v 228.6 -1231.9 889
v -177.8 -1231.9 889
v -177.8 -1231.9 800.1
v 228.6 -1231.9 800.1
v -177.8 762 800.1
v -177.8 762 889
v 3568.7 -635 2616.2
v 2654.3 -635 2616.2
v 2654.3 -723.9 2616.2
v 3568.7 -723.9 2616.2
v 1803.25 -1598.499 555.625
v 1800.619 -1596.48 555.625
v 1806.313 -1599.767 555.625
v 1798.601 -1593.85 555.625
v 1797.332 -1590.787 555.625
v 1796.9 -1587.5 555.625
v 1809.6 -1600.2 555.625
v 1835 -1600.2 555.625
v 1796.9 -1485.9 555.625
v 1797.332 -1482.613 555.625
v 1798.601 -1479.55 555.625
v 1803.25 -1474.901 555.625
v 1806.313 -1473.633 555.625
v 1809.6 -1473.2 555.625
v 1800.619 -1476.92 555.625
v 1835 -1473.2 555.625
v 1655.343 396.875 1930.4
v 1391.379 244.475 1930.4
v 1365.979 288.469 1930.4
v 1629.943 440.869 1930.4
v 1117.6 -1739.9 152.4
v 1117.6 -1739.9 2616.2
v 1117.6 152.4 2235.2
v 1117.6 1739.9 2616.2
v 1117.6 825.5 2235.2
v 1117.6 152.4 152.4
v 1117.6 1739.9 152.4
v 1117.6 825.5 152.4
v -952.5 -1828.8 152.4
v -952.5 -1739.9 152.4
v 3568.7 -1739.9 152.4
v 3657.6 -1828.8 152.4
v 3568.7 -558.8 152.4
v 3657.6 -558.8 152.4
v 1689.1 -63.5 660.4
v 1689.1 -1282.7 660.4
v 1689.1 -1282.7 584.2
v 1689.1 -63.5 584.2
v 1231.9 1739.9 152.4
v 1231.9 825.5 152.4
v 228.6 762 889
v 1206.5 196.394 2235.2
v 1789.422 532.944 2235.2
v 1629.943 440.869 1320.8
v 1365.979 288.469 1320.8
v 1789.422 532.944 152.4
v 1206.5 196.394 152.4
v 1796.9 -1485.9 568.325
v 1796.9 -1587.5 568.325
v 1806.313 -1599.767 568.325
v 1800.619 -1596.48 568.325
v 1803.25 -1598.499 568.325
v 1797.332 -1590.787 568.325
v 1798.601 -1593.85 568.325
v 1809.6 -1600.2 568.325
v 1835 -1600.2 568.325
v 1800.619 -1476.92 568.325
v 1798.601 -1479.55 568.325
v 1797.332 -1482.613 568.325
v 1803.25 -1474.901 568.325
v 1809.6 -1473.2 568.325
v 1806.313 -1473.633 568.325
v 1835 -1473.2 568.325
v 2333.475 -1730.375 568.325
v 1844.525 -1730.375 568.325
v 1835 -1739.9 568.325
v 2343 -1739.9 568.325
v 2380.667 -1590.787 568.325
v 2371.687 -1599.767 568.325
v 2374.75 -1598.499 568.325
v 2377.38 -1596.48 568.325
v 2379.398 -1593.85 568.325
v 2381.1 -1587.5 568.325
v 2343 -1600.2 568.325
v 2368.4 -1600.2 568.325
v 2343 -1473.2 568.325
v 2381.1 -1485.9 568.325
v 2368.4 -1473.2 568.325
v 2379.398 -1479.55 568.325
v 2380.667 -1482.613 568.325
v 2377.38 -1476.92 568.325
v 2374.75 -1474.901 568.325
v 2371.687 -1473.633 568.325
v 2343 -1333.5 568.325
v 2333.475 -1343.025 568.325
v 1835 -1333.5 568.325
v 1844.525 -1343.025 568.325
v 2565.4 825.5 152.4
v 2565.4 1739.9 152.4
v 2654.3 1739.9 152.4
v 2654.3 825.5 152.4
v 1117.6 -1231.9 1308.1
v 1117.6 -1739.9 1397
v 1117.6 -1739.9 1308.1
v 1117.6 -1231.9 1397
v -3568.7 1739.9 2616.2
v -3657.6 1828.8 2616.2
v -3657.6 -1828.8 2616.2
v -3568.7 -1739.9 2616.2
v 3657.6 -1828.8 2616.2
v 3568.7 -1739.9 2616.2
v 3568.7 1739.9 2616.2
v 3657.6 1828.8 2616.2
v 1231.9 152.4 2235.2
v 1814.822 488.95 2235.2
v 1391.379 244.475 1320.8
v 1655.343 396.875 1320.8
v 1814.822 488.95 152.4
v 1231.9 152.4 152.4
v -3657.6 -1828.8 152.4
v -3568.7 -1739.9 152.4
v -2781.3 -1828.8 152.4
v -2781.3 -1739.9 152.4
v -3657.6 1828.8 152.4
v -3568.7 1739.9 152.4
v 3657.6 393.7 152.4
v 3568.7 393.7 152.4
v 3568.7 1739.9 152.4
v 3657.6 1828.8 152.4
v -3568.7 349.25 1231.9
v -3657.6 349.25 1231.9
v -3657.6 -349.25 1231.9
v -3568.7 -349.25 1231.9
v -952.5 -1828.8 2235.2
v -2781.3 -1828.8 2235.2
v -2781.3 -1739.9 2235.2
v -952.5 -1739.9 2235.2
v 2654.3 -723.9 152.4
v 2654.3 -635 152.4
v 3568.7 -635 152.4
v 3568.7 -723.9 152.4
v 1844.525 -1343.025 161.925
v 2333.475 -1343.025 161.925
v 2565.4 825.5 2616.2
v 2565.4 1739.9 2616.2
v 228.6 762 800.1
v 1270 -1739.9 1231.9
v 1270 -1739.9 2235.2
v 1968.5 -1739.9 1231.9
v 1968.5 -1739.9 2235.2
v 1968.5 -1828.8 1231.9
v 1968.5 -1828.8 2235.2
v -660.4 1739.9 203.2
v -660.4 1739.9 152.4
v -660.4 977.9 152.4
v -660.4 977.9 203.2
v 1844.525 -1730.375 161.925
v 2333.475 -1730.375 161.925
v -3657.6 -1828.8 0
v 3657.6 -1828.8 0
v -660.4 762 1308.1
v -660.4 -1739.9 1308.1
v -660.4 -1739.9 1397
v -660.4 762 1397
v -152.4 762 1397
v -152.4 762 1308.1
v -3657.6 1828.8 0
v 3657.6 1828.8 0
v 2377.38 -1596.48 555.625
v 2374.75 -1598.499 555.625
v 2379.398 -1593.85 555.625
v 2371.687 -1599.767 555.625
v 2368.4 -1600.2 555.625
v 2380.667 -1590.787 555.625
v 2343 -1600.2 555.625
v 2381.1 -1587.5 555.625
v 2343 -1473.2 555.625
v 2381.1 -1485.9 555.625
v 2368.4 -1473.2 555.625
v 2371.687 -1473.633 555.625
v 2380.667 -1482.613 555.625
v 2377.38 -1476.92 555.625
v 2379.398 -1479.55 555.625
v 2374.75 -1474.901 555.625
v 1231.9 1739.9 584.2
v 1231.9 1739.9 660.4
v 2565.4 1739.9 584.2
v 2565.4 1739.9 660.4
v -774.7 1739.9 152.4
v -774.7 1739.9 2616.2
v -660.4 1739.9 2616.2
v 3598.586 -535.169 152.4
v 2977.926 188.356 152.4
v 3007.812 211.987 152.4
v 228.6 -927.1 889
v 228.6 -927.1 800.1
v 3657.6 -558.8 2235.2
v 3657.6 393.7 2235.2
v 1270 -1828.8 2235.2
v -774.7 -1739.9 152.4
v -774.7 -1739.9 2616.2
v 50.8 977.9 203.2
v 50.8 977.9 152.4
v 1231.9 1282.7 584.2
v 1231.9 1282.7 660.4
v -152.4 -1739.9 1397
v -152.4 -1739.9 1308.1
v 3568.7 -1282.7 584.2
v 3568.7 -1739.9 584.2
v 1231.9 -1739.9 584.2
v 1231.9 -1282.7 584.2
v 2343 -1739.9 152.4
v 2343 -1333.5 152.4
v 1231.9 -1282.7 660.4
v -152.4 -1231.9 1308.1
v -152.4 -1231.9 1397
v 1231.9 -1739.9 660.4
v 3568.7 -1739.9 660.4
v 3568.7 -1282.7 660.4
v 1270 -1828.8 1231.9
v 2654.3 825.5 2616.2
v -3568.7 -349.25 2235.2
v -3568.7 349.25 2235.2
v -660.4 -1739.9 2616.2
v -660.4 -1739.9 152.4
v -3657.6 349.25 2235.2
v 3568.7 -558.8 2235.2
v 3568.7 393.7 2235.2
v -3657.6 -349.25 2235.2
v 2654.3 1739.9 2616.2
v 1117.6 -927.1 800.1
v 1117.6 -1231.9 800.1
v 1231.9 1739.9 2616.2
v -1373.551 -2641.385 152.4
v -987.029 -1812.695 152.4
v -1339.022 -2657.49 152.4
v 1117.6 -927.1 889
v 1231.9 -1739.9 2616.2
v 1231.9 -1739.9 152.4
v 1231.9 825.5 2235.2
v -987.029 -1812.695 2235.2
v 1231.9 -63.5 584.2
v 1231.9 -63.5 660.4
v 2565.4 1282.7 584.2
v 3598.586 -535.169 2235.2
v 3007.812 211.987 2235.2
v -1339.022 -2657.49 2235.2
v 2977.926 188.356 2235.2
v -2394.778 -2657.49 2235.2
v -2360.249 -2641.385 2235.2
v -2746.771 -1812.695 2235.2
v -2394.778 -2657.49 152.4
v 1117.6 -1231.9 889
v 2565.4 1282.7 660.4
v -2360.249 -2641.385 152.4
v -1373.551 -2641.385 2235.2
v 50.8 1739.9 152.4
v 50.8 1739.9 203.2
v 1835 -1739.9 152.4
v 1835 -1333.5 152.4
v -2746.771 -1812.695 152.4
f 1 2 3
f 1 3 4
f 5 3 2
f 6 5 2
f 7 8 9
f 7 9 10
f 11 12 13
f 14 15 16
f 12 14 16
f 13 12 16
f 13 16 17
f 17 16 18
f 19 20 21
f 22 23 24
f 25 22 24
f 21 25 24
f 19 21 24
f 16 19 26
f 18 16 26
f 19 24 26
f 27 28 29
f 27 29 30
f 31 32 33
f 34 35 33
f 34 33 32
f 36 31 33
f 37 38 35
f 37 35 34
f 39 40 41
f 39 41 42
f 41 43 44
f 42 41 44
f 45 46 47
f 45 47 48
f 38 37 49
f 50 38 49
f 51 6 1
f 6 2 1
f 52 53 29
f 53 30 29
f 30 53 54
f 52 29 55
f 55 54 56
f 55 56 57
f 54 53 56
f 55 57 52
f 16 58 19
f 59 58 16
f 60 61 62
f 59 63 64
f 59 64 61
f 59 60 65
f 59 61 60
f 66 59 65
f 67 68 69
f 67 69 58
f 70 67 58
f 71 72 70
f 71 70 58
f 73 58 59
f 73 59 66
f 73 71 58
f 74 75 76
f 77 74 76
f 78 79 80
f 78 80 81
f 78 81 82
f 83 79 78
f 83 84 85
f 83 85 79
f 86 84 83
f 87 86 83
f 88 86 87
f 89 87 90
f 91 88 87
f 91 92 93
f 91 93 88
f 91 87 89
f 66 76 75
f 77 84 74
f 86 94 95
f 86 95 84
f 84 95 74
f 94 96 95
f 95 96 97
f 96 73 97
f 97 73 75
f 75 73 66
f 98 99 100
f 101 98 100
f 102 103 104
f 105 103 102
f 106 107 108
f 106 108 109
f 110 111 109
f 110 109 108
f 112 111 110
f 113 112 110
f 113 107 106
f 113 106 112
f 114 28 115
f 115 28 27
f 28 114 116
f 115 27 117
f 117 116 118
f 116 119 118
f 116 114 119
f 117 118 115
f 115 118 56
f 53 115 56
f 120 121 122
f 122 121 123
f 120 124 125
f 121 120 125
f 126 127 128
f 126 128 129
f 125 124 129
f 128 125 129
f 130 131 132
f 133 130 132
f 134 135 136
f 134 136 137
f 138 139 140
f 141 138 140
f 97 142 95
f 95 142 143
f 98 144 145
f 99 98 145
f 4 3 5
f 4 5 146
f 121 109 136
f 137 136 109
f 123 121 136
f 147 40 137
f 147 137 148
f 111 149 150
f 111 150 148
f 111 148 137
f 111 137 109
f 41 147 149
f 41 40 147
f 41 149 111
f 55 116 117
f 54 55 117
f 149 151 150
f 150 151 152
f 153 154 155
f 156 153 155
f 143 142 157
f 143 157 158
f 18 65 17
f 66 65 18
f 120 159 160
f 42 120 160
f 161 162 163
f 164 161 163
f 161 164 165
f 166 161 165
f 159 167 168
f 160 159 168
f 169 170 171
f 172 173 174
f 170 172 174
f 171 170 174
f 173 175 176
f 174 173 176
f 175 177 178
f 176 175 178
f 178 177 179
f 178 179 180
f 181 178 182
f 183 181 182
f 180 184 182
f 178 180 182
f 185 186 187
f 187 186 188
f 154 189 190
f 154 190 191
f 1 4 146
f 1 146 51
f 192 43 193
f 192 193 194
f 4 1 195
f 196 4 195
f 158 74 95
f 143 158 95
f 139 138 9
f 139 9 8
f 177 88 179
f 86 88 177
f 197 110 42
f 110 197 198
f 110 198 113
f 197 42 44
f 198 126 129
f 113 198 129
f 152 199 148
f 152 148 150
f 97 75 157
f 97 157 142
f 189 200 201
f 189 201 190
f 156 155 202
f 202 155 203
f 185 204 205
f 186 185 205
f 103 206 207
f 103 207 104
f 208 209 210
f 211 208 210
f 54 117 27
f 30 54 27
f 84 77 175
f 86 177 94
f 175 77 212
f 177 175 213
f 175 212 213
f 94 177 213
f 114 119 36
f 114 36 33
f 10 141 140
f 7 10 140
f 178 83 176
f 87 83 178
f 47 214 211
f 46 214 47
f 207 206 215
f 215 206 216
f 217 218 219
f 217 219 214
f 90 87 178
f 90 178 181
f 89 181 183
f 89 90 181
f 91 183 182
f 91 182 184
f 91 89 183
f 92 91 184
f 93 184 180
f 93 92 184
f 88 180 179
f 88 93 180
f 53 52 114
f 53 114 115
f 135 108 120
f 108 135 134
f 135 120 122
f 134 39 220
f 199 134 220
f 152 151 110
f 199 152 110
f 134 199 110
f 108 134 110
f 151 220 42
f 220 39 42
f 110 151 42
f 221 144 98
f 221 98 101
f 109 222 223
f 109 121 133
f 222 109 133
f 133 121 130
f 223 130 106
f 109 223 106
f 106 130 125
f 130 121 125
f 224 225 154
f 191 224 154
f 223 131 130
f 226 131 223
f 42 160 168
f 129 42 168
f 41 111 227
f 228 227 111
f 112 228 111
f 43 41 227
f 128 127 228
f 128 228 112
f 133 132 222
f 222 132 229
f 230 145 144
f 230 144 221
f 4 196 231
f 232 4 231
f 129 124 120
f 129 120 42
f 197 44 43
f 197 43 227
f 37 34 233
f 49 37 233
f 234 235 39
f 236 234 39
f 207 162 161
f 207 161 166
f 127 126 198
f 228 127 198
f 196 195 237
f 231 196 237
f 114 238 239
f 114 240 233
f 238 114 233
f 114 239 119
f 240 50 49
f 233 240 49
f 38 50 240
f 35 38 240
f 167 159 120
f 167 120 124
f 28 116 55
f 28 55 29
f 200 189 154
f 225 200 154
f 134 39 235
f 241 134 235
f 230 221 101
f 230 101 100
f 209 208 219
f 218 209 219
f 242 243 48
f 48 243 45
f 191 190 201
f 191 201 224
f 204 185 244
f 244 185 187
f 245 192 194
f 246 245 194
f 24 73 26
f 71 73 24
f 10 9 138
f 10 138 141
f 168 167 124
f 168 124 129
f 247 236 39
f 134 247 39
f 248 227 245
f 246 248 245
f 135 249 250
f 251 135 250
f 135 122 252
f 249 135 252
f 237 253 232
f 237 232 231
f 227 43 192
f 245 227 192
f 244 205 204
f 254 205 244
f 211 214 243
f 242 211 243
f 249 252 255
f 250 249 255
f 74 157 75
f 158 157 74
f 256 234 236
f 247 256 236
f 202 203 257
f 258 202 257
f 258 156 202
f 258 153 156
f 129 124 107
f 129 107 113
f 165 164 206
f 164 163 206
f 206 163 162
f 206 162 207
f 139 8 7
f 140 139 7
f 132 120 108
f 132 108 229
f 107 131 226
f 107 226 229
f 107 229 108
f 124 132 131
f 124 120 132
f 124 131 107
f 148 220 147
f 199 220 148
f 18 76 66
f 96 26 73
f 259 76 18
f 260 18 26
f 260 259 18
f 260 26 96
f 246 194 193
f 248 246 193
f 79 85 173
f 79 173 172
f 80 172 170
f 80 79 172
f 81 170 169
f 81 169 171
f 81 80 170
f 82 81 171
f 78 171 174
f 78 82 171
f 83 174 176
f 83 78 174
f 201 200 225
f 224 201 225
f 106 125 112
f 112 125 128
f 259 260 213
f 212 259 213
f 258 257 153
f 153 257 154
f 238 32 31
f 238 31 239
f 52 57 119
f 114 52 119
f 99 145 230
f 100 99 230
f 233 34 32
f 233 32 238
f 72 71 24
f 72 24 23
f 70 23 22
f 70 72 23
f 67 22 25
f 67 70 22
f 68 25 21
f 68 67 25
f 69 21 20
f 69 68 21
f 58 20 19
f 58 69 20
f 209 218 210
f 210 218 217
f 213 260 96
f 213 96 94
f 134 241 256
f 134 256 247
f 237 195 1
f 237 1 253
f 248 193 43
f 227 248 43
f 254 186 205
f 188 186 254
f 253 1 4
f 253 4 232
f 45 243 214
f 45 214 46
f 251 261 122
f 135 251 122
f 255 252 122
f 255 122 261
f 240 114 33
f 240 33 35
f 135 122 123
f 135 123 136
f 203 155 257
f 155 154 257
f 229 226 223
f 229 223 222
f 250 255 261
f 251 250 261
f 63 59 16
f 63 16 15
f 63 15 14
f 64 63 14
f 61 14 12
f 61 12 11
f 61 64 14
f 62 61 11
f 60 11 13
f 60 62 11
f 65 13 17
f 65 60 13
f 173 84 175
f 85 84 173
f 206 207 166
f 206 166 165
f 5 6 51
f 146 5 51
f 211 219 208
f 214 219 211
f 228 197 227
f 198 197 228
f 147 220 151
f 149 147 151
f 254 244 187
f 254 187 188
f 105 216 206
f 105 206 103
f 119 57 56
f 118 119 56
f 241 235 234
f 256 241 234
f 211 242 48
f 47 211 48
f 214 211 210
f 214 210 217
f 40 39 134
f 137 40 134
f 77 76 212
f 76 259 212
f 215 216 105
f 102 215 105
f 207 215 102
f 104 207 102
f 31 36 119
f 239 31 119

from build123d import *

# Parameters (mm, degrees)
F0_W           = 7315.2
F0_H           = 3657.6
F1_DEPTH       = 152.4
F2_W           = 7315.2
F2_H           = 3657.6
F2_W_2         = 7137.4
F2_H_2         = 3479.8
F3_DEPTH       = 2463.8
F4_W           = 952.5
F4_H           = 2082.8
F5_DEPTH       = 88.9
F6_W           = 1828.8
F6_H           = 2082.8
F6_W_2         = 698.5
F6_H_2         = 1003.3
F7_DEPTH       = 88.9
F8_W           = 698.5
F8_H           = 1003.3
F9_DEPTH       = 88.9
F10_W          = 114.3
F10_H          = 3479.8
F11_DEPTH      = 2463.8
F12_W          = 914.4
F12_H          = 88.9
F13_DEPTH      = 2463.8
F14_W          = 673.1
F14_H          = 2082.8
F15_DEPTH      = 114.3
F16_W          = 508
F16_H          = 88.9
F17_DEPTH      = 1739.9
F17_DEPTH_BACK = 762
F18_W          = 1270
F18_H          = 508
F19_DEPTH      = 88.9
F20_W          = 406.4
F20_H          = 88.9
F21_DEPTH      = 1231.9
F21_DEPTH_BACK = 762
F22_W          = 889
F22_H          = 304.8
F24_DEPTH      = 88.9
F26_DEPTH      = 2082.8
F28_DEPTH      = 2082.8
F29_W          = 2336.8
F29_H          = 76.2
F30_DEPTH      = 457.2
F31_W          = 304.8
F31_H          = 609.6
F32_DEPTH      = 50.8
F34_DEPTH      = 50.8
F35_W          = 508
F35_H          = 406.4
F36_DEPTH      = 9.525
F37_W          = 508
F37_H          = 406.4
F37_W_2        = 488.95
F37_H_2        = 387.35
F38_DEPTH      = 406.4
F40_DEPTH      = 12.7
F42_DEPTH      = 2082.8
F43_W          = 88.9
F43_H          = 914.4
F44_DEPTH      = 2463.8
F45_W          = 457.2
F45_H          = 1219.2
F46_DEPTH      = 76.2
F47_W          = 1333.5
F47_H          = 76.2
F48_DEPTH      = 457.2


with BuildPart() as f1:
    # F0 (on Top) → F1 (new body)
    with BuildSketch(Plane.XY):
        Rectangle(F0_W, F0_H)
    extrude(amount=F1_DEPTH)


with BuildPart() as f3:
    # F2 (on face) → F3 (new body)
    with BuildSketch(Plane.XY.offset(152.4)):
        Rectangle(F2_W, F2_H)
        Rectangle(F2_W_2, F2_H_2, mode=Mode.SUBTRACT)
    extrude(amount=F3_DEPTH)

    # F4 (on face) → F5 (cut, through all)
    with BuildSketch(Plane.YZ.offset(3657.6)):
        with Locations((-82.55, 1193.8)):
            Rectangle(F4_W, F4_H)
    extrude(amount=-F5_DEPTH, mode=Mode.SUBTRACT)

    # F6 (on face) → F7 (cut, through all)
    with BuildSketch(Plane.XZ.offset(1828.8)):
        with Locations((-1866.9, 1193.8)):
            Rectangle(F6_W, F6_H)
        with Locations((1619.25, 1733.55)):
            Rectangle(F6_W_2, F6_H_2)
    extrude(amount=-F7_DEPTH, mode=Mode.SUBTRACT)

    # F8 (on face) → F9 (cut, through all)
    with BuildSketch(Plane(origin=(-3657.6, 0, 0), x_dir=(0, -1, 0), z_dir=(-1, 0, 0))):
        with Locations((0, 1733.55)):
            Rectangle(F8_W, F8_H)
    extrude(amount=-F9_DEPTH, mode=Mode.SUBTRACT)


with BuildPart() as f11:
    # F10 (on face) → F11 (new body, through all)
    with BuildSketch(Plane.XY.offset(152.4)):
        with Locations((-717.55, 0)):
            Rectangle(F10_W, F10_H)
    extrude(amount=F11_DEPTH)


with BuildPart() as f11b:
    # F10 (on face) → F11, piece 2 (new body, through all)
    with BuildSketch(Plane.XY.offset(152.4)):
        with Locations((1174.75, 0)):
            Rectangle(F10_W, F10_H)
    extrude(amount=F11_DEPTH)

    # F14 (on face) → F15 (cut, through all)
    with BuildSketch(Plane.YZ.offset(1231.9)):
        with Locations((488.95, 1193.8)):
            Rectangle(F14_W, F14_H)
    extrude(amount=-F15_DEPTH, mode=Mode.SUBTRACT)


with BuildPart() as f13:
    # F12 (on face) → F13 (new body, through all)
    with BuildSketch(Plane.XY.offset(152.4)):
        with Locations((3111.5, -679.45)):
            Rectangle(F12_W, F12_H)
    extrude(amount=F13_DEPTH)


with BuildPart() as f17:
    # F16 (on Front) → F17 (new body, two sides)
    with BuildSketch(Plane.XZ) as f17_sk:
        with Locations((-406.4, 1352.55)):
            Rectangle(F16_W, F16_H)
    extrude(amount=F17_DEPTH)
    extrude(f17_sk.sketch, amount=-F17_DEPTH_BACK)


with BuildPart() as f19:
    # F18 (on face) → F19 (new body, through all)
    with BuildSketch(Plane.XY.offset(1397)):
        with Locations((482.6, -1485.9)):
            Rectangle(F18_W, F18_H)
    extrude(amount=-F19_DEPTH)


with BuildPart() as f21:
    # F20 (on Front) → F21 (new body, two sides)
    with BuildSketch(Plane.XZ) as f21_sk:
        with Locations((25.4, 844.55)):
            Rectangle(F20_W, F20_H)
    extrude(amount=F21_DEPTH)
    extrude(f21_sk.sketch, amount=-F21_DEPTH_BACK)


with BuildPart() as f24:
    # F22 (on face) → F24 (new body, through all)
    with BuildSketch(Plane.XY.offset(889)):
        with Locations((673.1, -1079.5)):
            Rectangle(F22_W, F22_H)
    extrude(amount=-F24_DEPTH)


with BuildPart() as f26:
    # F25 (on face) → F26 (new body)
    with BuildSketch(Plane.XY.offset(152.4)):
        Polygon((1789.4216992873, 532.9440905122), (1206.5, 196.3940905122), (1231.9, 152.4), (1814.8216992873, 488.95), align=None)
    extrude(amount=F26_DEPTH)

    # F31 (on face) → F32 (cut, through all)
    with BuildSketch(Plane(origin=(241.9838642316, -419.128347461, 0), x_dir=(0.8660254038, 0.5, 0), z_dir=(0.5, -0.8660254038, 0))):
        with Locations((1479.6066949221, 1625.6)):
            Rectangle(F31_W, F31_H)
    extrude(amount=-F32_DEPTH, mode=Mode.SUBTRACT)


with BuildPart() as f28:
    # F27 (on face) → F28 (new body)
    with BuildSketch(Plane.XY.offset(152.4)):
        Polygon((2977.9257969634, 188.3560018005), (3568.7, -558.8), (3598.586240072, -535.1690318785), (3007.8120370354, 211.986969922), align=None)
    extrude(amount=F28_DEPTH)


with BuildPart() as f30:
    # F29 (on face) → F30 (new body)
    with BuildSketch(Plane(origin=(0, -1739.9, 0), x_dir=(-1, 0, 0), z_dir=(0, 1, 0))):
        with Locations((-2400.3, 622.3)):
            Rectangle(F29_W, F29_H)
    extrude(amount=F30_DEPTH)


with BuildPart() as f34:
    # F33 (on face) → F34 (new body)
    with BuildSketch(Plane.XY.offset(152.4)):
        Polygon((-660.4, 977.9), (50.8, 977.9), (50.8, 1358.9), (50.8, 1739.9), (-660.4, 1739.9), align=None)
    extrude(amount=F34_DEPTH)


with BuildPart() as f36:
    # F35 (on face) → F36 (new body)
    with BuildSketch(Plane.XY.offset(152.4)):
        with Locations((2088.9996967316, -1536.7)):
            Rectangle(F35_W, F35_H)
    extrude(amount=F36_DEPTH)

    # F37 (on face) → F38 (join)
    with BuildSketch(Plane.XY.offset(161.925)):
        with Locations((2088.9996967316, -1536.7)):
            Rectangle(F37_W, F37_H)
        with Locations((2088.9996967316, -1536.7)):
            Rectangle(F37_W_2, F37_H_2, mode=Mode.SUBTRACT)
    extrude(amount=F38_DEPTH)

    # F39 (on face) → F40 (join)
    with BuildSketch(Plane.XY.offset(568.325)):
        with BuildLine():
            Line((1809.5996967316, -1600.2), (1834.9996967316, -1600.2))
            Line((1834.9996967316, -1600.2), (1834.9996967316, -1473.2))
            Line((1834.9996967316, -1473.2), (1809.5996967316, -1473.2))
            ThreePointArc((1809.5996967316, -1473.2), (1800.6194406105, -1476.9197438789), (1796.8996967316, -1485.9))
            Line((1796.8996967316, -1485.9), (1796.8996967316, -1587.5))
            ThreePointArc((1796.8996967316, -1587.5), (1800.6194406105, -1596.4802561211), (1809.5996967316, -1600.2))
        make_face()
        with BuildLine():
            Line((2342.9996967316, -1473.2), (2342.9996967316, -1600.2))
            Line((2342.9996967316, -1600.2), (2368.3996967316, -1600.2))
            ThreePointArc((2368.3996967316, -1600.2), (2377.3799528526, -1596.4802561211), (2381.0996967316, -1587.5))
            Line((2381.0996967316, -1587.5), (2381.0996967316, -1485.9))
            ThreePointArc((2381.0996967316, -1485.9), (2377.3799528526, -1476.9197438789), (2368.3996967316, -1473.2))
            Line((2368.3996967316, -1473.2), (2342.9996967316, -1473.2))
        make_face()
    extrude(amount=-F40_DEPTH)


with BuildPart() as f42:
    # F41 (on face) → F42 (new body)
    with BuildSketch(Plane.XY.offset(152.4)):
        Polygon((-2746.7712332818, -1812.6948992887), (-2781.3, -1828.8), (-2394.7775829299, -2657.490401237), (-2360.2488162117, -2641.3853005257), align=None)
    extrude(amount=F42_DEPTH)


with BuildPart() as f42b:
    # F41 (on face) → F42, piece 2 (new body)
    with BuildSketch(Plane.XY.offset(152.4)):
        Polygon((-1339.0224170701, -2657.490401237), (-952.5, -1828.8), (-987.0287667182, -1812.6948992887), (-1373.5511837883, -2641.3853005257), align=None)
    extrude(amount=F42_DEPTH)


with BuildPart() as f44:
    # F43 (on face) → F44 (new body)
    with BuildSketch(Plane.XY.offset(152.4)):
        with Locations((2609.85, 1282.7)):
            Rectangle(F43_W, F43_H)
    extrude(amount=F44_DEPTH)


with BuildPart() as f46:
    # F45 (on face) → F46 (new body)
    with BuildSketch(Plane.XY.offset(660.4)):
        with Locations((1460.5, -673.1)):
            Rectangle(F45_W, F45_H)
    extrude(amount=-F46_DEPTH)


with BuildPart() as f48:
    # F47 (on face) → F48 (new body)
    with BuildSketch(Plane.XZ.offset(-1739.9)):
        with Locations((1898.65, 622.3)):
            Rectangle(F47_W, F47_H)
    extrude(amount=F48_DEPTH)


solid = Compound([f1.part, f3.part, f11.part, f11b.part, f13.part, f17.part, f19.part, f21.part, f24.part, f26.part, f28.part, f30.part, f34.part, f36.part, f42.part, f42b.part, f44.part, f46.part, f48.part])
